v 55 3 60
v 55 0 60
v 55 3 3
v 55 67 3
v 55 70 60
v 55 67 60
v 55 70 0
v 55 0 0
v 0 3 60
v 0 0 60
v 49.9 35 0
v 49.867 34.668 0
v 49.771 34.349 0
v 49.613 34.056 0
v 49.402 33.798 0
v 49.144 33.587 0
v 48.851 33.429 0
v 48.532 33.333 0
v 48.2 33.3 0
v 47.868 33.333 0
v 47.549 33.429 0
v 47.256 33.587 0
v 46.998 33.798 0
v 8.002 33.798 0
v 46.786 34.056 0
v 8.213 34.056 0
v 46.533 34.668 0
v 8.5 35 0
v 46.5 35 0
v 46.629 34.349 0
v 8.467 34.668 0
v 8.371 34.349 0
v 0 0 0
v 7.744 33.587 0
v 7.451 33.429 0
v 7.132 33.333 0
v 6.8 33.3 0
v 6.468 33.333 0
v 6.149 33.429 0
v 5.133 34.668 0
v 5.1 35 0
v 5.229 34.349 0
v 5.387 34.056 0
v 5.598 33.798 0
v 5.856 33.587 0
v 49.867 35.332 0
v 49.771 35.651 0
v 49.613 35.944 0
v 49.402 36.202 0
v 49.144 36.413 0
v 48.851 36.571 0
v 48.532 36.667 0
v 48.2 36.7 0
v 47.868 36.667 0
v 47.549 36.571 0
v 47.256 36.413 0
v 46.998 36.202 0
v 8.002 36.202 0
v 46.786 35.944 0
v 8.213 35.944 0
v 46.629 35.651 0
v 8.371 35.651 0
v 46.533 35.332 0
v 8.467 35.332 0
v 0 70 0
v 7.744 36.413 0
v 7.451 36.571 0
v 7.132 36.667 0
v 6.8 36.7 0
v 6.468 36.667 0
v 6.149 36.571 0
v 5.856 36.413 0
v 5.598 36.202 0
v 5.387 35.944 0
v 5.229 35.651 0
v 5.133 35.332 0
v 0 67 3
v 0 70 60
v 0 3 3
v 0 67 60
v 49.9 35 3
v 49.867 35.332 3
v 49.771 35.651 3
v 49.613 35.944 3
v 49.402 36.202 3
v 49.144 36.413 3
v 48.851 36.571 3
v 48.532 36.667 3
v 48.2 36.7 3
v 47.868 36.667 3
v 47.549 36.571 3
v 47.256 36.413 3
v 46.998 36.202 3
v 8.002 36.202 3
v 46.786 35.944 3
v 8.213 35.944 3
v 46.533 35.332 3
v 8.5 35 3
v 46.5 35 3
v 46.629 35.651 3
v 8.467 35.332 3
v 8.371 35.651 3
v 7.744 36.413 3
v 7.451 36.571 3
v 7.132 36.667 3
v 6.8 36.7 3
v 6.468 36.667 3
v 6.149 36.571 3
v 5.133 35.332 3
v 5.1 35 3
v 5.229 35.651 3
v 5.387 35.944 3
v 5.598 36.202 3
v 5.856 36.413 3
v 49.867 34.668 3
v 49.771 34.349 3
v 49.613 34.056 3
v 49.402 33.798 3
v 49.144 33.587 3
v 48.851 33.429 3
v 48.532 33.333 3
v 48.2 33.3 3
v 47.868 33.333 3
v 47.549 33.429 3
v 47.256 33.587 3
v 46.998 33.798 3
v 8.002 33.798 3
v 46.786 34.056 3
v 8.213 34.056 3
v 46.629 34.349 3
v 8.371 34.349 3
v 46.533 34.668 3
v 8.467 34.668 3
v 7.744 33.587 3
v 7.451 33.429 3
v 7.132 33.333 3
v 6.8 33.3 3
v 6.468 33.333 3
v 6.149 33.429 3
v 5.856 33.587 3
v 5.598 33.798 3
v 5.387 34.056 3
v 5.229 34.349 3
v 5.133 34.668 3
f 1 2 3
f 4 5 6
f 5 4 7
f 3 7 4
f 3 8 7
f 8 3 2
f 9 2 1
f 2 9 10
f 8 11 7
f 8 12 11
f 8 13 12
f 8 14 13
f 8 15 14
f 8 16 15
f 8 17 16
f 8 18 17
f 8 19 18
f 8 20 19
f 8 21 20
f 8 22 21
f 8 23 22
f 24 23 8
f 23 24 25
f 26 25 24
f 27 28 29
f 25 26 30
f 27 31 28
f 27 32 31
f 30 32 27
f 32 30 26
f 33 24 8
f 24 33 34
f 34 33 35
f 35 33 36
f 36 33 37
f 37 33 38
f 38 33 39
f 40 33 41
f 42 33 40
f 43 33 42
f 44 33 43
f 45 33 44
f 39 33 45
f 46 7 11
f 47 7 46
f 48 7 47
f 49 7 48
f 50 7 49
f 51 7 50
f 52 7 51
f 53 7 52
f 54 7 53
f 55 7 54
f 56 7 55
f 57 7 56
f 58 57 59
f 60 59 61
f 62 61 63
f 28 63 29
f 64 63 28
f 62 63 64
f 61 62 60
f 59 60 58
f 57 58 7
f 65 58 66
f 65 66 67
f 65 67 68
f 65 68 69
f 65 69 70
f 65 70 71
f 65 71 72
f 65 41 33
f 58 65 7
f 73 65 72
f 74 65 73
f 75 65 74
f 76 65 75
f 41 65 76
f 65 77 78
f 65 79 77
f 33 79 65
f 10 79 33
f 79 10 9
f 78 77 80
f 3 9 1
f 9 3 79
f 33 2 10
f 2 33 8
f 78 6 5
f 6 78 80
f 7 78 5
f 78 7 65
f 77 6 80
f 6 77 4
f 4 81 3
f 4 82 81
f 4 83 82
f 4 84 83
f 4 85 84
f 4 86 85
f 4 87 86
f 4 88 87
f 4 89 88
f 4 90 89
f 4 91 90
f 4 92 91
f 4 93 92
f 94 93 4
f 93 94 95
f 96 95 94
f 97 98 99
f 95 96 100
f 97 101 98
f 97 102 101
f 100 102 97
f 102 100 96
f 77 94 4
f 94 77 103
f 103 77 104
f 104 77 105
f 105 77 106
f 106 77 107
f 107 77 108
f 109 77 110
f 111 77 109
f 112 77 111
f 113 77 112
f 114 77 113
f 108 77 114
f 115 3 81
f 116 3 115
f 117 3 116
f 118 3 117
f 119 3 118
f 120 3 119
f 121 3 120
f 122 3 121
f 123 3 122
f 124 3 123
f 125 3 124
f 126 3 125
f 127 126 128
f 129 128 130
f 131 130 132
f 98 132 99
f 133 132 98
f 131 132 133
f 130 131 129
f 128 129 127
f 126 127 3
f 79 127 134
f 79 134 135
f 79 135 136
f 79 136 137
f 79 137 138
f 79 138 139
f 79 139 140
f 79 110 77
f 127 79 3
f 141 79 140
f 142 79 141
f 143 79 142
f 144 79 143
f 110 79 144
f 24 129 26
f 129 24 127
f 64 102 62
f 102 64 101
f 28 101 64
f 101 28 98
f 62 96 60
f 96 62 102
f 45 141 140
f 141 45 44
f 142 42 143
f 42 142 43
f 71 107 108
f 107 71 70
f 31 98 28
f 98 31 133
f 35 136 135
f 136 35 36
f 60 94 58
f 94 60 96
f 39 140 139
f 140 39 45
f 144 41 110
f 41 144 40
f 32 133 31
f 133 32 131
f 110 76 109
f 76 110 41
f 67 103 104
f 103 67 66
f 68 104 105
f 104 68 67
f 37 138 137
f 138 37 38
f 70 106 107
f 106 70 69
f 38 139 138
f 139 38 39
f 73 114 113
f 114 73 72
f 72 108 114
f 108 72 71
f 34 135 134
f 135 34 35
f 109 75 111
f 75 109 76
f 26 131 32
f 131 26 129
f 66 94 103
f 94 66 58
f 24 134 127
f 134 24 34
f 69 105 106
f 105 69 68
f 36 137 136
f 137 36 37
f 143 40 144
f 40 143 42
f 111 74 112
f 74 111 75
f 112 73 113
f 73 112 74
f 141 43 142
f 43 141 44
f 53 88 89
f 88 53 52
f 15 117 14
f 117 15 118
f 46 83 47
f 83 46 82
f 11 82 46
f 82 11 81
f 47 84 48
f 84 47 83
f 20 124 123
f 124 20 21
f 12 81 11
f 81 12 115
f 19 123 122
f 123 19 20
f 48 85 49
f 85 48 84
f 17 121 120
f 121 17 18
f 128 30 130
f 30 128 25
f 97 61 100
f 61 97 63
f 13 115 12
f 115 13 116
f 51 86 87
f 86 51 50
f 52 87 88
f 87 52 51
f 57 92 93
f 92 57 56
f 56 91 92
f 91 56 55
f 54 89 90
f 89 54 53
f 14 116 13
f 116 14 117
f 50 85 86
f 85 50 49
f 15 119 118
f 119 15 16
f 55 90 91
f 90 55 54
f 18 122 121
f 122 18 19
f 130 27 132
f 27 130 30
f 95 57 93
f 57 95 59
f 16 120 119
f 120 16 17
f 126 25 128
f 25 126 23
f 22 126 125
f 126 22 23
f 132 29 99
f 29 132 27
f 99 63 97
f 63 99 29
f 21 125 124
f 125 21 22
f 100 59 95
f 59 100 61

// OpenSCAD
$fn = 32;

// ----------------------------------------------------------------------
// U-bracket: 55 x 70 x 60 mm
// ----------------------------------------------------------------------

// --- parameters (mm) ---
base_len = 55;            // outer length, X
channel_w = 70;           // outer width, Y
upright_h = 60;           // upright height, Z
mat_t = 3;                // wall thickness
hole_d = 3.4;             // clearance for M3

module hole_z(px, py) {
  translate([px, py, -2.5]) cylinder(h = mat_t + 5, d = hole_d);
}
module hole_y_pz(pz) {
  /* through both uprights along Y */
  translate([0, -2.5, pz]) rotate([-90, 0, 0]) cylinder(h = channel_w + 5, d = hole_d);
}

module base() {
  cube([base_len, channel_w, mat_t]);
}

module uprights() {
  cube([base_len, mat_t, upright_h]);
  translate([0, channel_w - mat_t, 0]) cube([base_len, mat_t, upright_h]);
}

difference() {
  union() {
    base();
    uprights();
  }
  hole_z(6.8, 35);
  hole_z(48.2, 35);
}
